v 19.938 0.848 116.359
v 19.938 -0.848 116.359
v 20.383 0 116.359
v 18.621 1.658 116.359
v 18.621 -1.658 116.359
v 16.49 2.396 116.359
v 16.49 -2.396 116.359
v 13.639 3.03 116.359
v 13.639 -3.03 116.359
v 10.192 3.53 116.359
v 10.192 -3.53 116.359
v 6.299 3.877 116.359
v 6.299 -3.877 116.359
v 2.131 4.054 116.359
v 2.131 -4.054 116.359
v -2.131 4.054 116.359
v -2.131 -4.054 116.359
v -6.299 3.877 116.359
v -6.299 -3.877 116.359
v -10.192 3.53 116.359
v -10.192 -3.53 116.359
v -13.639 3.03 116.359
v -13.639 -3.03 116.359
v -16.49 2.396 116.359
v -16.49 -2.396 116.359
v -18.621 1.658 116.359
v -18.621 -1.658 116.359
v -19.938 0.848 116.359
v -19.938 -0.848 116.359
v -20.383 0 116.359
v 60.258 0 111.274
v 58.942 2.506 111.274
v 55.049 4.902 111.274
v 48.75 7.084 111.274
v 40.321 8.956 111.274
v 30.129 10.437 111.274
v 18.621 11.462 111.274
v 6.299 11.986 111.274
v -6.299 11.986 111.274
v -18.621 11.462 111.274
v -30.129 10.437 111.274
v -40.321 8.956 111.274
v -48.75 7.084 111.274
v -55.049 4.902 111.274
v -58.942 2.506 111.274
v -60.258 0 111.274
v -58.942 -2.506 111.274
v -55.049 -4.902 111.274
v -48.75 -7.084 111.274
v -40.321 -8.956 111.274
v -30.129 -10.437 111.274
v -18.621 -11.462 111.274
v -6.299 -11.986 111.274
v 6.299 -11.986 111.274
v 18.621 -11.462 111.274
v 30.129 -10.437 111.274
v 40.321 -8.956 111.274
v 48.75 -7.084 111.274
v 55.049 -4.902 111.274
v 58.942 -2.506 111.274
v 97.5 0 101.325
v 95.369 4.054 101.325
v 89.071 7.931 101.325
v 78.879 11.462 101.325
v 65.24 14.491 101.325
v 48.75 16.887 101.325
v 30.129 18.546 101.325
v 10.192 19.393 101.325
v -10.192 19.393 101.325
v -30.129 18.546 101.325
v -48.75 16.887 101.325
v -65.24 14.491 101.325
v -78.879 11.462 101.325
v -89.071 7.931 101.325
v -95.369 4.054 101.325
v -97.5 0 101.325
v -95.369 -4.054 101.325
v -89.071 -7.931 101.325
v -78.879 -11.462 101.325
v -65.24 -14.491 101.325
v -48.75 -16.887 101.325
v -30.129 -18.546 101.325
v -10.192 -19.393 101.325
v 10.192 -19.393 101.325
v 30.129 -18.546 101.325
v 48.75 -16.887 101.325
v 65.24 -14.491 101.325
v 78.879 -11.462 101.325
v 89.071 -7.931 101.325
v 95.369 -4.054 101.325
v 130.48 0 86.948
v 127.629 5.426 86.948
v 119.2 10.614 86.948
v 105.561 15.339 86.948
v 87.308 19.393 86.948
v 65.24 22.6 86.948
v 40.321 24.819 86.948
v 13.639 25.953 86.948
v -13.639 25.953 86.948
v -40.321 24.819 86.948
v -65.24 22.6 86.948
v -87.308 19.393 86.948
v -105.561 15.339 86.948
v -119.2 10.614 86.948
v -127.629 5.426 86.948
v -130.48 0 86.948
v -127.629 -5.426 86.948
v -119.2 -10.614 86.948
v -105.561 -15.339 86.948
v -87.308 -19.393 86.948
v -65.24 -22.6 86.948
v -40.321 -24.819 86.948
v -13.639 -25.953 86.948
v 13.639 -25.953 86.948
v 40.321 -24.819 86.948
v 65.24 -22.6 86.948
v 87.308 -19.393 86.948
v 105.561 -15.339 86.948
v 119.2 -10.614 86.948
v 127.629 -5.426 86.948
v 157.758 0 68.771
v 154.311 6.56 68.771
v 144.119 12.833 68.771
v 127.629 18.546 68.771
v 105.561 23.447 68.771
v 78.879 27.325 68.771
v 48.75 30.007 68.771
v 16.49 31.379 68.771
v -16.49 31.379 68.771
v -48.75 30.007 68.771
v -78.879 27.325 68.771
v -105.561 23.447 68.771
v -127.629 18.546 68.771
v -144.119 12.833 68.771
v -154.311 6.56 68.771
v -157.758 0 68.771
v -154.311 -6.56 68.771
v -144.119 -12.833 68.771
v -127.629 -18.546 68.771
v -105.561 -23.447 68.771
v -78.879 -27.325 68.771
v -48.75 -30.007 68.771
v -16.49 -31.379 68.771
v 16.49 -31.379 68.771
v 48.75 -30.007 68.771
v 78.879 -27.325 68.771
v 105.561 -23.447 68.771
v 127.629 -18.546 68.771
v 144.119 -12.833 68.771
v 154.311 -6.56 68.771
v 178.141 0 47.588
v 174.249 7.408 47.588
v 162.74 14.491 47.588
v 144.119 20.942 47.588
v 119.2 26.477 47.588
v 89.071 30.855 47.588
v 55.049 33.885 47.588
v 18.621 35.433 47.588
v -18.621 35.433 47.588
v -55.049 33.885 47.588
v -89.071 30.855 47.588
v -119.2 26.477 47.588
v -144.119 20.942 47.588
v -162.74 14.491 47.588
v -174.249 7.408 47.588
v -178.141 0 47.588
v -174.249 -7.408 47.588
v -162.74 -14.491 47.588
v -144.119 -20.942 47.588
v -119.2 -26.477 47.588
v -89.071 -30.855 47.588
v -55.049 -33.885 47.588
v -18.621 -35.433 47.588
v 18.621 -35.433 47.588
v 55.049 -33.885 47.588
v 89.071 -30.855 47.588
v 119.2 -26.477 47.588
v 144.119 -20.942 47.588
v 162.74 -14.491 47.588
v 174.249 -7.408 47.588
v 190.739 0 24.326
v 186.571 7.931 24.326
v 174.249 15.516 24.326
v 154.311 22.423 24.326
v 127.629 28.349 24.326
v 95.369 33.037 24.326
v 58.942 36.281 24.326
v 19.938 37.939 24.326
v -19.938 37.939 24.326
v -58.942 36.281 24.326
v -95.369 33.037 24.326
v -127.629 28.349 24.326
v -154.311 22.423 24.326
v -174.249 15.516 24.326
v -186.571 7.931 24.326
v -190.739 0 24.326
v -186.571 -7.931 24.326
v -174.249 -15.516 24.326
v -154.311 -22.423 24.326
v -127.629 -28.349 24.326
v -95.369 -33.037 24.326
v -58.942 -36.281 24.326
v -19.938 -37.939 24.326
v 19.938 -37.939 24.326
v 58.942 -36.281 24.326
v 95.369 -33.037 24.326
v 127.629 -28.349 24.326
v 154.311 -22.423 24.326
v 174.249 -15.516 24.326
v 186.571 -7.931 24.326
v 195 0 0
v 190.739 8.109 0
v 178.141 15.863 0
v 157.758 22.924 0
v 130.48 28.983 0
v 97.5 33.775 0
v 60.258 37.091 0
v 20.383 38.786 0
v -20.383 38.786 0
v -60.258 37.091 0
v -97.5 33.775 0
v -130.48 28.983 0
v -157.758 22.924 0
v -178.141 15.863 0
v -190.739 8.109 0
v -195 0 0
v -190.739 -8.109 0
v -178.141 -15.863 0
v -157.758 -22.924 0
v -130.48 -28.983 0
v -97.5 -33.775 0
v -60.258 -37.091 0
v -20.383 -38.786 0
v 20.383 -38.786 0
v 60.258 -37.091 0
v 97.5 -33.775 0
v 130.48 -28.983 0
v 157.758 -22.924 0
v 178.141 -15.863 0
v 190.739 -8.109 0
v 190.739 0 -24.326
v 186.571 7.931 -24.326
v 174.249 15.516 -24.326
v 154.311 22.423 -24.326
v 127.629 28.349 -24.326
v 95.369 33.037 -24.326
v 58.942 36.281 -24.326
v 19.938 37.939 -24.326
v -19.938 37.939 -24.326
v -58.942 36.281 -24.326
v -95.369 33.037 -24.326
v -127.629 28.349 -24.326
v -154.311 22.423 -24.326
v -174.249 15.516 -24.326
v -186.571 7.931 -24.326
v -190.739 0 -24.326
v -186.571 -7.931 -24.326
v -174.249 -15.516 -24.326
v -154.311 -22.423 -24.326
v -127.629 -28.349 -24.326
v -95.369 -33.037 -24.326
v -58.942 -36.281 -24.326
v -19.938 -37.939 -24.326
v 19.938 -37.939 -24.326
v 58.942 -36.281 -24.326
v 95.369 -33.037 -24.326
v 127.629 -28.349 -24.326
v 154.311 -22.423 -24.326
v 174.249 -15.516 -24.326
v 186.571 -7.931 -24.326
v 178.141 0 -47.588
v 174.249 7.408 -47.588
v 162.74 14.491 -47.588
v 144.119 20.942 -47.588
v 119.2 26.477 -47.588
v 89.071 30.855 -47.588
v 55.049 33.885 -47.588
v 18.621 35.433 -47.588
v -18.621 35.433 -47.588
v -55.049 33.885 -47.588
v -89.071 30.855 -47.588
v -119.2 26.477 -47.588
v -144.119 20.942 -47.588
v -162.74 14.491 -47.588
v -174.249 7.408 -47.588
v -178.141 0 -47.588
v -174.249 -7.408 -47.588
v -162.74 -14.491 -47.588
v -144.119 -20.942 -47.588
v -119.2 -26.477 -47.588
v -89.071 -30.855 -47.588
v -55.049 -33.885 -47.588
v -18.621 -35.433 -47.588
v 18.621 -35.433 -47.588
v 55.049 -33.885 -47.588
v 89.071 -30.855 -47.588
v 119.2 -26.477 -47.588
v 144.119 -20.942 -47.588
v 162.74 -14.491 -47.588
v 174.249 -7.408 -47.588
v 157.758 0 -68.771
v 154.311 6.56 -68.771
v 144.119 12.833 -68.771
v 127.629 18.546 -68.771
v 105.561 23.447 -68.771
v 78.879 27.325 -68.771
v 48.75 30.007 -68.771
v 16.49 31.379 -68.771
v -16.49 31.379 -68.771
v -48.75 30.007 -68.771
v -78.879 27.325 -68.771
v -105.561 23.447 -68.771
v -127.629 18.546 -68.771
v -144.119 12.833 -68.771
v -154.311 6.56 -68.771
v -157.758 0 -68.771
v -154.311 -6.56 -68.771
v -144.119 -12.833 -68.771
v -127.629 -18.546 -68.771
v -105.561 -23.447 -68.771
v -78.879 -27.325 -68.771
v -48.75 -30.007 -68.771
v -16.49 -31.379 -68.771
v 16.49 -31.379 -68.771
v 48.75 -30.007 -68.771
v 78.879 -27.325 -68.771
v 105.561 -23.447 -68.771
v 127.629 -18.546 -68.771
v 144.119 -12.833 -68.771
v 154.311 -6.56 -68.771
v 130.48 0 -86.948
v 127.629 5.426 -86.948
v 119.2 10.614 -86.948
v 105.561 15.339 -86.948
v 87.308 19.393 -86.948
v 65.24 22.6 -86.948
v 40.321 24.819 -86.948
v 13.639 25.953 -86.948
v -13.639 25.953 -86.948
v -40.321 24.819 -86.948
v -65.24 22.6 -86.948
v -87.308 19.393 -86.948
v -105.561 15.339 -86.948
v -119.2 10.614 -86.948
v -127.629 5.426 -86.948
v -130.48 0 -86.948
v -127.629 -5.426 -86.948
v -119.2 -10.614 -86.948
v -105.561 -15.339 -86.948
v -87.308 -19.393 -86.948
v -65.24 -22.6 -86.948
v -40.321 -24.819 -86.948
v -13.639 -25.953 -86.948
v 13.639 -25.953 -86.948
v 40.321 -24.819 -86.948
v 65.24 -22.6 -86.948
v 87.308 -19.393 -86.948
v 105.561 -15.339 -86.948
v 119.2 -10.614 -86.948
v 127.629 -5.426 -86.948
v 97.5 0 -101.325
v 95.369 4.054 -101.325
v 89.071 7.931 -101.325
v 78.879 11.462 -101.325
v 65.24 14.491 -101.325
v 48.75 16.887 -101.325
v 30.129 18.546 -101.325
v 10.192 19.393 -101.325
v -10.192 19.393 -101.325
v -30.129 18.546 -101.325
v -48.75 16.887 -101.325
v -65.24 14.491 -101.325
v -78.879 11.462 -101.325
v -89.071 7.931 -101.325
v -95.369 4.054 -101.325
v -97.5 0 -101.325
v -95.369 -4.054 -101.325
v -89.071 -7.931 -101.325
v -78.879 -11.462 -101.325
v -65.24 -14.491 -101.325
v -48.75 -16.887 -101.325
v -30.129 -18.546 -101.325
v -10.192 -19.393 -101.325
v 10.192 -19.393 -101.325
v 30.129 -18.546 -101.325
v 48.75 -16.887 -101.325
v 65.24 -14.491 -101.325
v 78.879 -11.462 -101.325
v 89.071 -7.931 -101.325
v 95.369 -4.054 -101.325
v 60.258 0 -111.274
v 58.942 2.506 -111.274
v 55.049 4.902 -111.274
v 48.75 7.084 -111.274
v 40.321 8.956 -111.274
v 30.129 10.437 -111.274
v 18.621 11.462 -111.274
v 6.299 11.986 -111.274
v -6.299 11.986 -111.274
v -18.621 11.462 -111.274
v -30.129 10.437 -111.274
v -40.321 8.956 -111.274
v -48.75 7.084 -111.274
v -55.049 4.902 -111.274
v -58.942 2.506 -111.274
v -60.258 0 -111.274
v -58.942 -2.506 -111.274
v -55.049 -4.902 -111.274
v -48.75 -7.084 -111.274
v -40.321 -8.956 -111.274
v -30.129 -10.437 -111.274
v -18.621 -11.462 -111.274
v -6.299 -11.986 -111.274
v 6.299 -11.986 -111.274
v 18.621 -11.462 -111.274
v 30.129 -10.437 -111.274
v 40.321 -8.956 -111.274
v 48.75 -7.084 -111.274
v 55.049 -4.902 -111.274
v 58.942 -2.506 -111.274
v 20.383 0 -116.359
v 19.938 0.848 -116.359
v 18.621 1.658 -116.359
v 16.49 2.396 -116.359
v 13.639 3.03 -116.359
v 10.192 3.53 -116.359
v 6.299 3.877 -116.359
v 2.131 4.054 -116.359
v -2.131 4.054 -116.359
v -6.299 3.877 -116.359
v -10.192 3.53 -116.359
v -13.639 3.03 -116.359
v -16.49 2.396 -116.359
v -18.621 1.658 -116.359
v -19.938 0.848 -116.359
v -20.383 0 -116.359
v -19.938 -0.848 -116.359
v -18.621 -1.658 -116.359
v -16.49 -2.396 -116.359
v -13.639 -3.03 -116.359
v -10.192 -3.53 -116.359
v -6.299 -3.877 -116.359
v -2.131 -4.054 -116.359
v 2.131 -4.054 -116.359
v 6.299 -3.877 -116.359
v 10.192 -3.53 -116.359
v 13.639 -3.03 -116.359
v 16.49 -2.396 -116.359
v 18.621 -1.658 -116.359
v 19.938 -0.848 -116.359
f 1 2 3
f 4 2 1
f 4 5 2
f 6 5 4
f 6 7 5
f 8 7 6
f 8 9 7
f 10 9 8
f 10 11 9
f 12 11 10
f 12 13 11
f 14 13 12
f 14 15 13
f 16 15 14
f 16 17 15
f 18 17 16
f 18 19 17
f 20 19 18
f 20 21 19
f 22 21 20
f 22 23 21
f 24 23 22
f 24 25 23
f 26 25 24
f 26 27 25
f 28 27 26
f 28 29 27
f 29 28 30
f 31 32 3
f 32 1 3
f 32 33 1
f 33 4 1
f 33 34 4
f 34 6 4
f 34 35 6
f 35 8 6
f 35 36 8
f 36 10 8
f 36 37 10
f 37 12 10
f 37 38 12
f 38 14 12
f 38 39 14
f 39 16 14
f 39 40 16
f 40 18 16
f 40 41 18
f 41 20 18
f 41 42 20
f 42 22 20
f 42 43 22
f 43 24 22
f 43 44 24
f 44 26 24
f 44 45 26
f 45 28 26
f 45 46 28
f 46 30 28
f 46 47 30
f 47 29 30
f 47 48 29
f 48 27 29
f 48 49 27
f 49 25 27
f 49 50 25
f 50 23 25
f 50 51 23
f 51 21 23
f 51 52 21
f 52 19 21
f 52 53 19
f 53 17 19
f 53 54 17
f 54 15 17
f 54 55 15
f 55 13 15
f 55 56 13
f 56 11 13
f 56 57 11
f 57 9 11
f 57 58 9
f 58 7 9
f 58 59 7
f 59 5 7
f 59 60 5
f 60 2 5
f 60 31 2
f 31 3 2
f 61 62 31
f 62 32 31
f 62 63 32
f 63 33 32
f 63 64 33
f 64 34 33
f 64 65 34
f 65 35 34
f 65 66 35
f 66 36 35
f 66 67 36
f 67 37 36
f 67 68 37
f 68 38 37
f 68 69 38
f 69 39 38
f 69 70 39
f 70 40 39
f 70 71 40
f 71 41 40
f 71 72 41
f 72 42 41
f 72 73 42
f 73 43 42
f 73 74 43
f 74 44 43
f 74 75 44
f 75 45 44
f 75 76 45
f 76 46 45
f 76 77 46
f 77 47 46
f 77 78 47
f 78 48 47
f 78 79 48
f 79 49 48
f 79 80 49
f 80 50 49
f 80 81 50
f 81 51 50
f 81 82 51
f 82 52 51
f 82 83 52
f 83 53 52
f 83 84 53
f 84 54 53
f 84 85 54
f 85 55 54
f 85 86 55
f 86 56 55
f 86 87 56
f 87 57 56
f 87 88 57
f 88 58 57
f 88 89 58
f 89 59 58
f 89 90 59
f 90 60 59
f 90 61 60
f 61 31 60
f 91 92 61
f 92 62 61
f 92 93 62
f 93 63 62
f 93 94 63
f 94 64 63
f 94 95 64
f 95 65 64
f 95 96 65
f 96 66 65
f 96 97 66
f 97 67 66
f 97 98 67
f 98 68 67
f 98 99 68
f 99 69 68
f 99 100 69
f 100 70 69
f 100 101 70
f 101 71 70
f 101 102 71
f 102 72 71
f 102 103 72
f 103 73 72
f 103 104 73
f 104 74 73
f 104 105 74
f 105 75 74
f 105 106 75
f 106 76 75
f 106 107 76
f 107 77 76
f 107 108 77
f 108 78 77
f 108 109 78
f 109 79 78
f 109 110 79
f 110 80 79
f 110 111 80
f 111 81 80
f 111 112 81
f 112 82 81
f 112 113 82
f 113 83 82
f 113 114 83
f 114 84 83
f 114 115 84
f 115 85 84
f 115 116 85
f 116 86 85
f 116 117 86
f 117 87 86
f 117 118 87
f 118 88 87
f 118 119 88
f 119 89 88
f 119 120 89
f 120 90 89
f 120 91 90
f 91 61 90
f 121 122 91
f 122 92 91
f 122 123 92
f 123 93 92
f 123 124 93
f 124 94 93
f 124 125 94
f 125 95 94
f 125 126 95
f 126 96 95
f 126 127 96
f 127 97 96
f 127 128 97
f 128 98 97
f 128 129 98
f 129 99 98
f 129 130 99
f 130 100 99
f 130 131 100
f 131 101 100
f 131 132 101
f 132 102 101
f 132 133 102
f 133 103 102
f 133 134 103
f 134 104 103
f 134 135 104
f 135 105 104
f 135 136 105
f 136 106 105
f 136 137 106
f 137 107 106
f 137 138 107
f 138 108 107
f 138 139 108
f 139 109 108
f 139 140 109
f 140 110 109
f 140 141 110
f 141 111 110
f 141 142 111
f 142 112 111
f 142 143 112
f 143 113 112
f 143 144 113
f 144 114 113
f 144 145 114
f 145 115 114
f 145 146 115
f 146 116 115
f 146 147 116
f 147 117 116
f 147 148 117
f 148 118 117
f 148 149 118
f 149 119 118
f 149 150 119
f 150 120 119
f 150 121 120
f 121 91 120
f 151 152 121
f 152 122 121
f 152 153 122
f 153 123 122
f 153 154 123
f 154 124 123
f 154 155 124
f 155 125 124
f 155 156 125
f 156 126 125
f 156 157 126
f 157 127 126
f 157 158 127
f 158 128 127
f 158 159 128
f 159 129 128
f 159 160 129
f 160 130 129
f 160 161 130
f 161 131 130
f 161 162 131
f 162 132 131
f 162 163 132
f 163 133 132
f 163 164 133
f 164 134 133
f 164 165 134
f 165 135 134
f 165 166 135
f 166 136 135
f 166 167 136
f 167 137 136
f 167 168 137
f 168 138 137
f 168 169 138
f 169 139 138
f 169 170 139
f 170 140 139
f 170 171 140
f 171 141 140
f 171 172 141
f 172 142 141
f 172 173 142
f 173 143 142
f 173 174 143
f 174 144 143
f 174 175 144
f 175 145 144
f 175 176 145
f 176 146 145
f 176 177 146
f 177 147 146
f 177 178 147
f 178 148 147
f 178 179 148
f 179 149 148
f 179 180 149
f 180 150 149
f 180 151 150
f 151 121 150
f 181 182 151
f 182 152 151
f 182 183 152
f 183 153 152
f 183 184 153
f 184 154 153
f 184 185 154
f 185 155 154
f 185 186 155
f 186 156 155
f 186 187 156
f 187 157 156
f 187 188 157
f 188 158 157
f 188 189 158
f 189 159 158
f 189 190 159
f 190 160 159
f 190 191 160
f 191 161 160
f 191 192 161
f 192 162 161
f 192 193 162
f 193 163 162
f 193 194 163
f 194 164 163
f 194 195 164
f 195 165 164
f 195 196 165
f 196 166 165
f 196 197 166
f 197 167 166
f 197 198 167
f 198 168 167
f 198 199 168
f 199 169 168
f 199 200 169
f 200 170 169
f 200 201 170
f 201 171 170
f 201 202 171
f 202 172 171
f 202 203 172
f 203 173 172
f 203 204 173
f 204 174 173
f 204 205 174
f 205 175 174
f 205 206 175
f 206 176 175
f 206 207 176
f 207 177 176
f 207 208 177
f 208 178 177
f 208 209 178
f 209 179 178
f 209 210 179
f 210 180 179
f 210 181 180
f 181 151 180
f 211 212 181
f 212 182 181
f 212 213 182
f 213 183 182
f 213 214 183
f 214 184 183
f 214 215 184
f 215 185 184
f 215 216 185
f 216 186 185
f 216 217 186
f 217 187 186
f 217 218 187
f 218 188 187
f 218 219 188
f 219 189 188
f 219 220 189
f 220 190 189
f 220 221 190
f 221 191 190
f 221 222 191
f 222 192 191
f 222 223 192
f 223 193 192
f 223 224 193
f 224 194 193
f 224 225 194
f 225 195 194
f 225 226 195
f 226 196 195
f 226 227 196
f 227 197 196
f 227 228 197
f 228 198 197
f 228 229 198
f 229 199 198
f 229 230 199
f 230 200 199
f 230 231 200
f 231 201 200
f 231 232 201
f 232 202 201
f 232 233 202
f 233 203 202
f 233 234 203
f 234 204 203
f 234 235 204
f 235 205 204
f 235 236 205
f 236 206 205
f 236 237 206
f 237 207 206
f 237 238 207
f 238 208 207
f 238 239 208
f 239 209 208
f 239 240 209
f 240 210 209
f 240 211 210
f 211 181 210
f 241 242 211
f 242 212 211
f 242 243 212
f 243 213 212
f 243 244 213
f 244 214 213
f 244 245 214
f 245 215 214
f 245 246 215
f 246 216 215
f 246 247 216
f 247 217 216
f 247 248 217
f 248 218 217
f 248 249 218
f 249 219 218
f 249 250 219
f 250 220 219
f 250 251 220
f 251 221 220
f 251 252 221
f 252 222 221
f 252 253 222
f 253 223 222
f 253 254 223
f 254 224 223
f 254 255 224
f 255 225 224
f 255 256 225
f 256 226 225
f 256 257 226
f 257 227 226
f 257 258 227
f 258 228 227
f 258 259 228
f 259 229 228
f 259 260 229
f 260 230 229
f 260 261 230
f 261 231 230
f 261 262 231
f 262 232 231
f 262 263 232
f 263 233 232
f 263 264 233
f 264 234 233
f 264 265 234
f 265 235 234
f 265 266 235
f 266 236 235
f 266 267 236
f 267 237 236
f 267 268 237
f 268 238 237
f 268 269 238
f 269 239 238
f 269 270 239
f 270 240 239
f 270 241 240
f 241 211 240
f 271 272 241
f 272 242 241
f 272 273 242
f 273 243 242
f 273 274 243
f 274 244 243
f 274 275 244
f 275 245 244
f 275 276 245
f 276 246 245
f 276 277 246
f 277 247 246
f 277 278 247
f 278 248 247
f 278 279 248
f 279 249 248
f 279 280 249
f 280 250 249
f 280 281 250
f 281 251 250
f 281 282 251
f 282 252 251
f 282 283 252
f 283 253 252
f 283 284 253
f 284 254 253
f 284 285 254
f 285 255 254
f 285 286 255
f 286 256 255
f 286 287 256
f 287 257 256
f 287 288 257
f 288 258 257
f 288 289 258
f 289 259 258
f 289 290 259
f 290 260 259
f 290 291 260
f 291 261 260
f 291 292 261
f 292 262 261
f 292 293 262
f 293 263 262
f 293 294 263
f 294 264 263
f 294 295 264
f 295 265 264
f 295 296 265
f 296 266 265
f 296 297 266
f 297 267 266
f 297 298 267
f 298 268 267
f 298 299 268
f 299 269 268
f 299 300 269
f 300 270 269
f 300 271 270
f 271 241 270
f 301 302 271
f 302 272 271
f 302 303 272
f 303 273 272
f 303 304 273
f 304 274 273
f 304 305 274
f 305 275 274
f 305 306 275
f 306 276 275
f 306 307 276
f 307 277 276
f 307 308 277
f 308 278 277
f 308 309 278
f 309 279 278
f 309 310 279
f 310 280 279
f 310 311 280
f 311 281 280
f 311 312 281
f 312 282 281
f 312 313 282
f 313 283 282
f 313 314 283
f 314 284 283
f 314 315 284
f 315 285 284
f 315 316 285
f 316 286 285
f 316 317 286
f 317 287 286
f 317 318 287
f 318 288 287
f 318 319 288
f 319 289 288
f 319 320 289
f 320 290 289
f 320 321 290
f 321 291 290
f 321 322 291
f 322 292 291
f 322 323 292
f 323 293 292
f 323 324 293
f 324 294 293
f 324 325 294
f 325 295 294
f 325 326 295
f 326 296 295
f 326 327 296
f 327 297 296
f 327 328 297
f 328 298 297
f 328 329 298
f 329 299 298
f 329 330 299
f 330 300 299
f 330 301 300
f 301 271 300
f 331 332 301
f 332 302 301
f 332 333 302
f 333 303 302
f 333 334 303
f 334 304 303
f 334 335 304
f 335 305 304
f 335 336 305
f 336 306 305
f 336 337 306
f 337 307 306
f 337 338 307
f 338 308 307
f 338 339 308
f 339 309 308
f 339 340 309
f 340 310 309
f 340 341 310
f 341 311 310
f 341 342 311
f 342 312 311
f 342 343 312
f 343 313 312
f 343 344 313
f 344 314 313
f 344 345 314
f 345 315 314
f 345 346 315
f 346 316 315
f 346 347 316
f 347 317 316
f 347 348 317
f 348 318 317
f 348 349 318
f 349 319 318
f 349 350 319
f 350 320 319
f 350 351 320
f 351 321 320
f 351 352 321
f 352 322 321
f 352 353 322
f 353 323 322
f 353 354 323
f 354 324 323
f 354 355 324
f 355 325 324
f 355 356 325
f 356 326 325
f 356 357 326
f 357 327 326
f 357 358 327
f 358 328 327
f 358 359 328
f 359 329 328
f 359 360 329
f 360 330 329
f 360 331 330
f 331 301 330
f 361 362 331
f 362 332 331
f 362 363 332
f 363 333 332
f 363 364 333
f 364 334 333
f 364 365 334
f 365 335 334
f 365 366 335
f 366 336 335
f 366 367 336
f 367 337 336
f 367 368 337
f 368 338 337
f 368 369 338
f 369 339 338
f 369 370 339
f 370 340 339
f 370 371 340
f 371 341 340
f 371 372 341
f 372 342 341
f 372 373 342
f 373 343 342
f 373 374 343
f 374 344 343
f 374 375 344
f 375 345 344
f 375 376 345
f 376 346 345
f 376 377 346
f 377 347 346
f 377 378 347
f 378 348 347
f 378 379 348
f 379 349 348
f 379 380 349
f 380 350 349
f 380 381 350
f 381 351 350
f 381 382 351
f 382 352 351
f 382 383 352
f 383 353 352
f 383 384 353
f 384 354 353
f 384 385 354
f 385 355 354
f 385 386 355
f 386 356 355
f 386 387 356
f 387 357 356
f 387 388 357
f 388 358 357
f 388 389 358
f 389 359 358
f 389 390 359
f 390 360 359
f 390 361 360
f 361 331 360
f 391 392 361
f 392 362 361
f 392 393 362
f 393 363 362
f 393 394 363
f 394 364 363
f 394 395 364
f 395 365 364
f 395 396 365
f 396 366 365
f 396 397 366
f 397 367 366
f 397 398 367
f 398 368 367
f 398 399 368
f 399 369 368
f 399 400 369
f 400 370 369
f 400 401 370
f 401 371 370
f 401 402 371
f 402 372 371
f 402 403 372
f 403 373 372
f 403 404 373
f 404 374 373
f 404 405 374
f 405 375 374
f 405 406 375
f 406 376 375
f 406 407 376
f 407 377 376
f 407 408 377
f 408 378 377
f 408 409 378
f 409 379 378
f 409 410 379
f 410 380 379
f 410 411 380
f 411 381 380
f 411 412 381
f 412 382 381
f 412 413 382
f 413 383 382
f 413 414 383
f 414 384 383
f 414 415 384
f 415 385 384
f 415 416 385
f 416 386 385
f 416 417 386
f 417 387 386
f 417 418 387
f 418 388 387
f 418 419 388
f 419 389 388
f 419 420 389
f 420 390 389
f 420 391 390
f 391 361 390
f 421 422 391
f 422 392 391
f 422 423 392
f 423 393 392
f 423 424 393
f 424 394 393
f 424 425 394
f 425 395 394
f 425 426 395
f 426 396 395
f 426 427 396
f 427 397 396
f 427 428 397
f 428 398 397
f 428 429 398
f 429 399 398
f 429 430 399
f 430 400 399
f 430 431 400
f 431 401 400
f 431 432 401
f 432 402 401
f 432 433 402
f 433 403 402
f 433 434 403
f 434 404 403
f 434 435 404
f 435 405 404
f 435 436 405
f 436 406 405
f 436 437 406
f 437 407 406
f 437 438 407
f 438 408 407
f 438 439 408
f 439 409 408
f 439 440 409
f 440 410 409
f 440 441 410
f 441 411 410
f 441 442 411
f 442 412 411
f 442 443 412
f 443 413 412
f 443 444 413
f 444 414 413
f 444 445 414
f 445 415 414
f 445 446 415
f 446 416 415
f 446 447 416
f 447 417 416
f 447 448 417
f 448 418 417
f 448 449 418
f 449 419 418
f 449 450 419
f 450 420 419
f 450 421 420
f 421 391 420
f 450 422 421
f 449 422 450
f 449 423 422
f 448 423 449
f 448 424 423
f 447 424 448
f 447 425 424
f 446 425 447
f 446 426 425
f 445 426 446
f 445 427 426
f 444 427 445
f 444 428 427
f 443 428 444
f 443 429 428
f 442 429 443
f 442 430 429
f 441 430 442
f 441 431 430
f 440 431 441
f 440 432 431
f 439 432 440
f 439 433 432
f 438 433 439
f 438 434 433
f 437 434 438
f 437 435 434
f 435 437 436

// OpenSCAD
// Generated by SolidPython 1.0.1 on 2020-07-29 00:46:51


scale(v = [15, 3, 9]) {
	sphere(r = 13);
}
/***********************************************
*********      SolidPython code:      **********
************************************************
 
# import packages: SolidPython
from solid import *
from solid.utils import *
from itertools import chain, combinations, permutations


class Resize:

    def __init__(self, scad_file):
        self.scad_file = scad_file
        #self.scad_file = import_scad(scad_file)
        # cone/cylinder param:
        self.r1 = 0
        self.r2 = 0
        self.h = 0
        # rectangular prism param:
        self.w = 0
        self.l = 0
        # ellipse param:
        self.r = 0

    # import OpenScad code (file name corresponds to shape)


    # classify shape + parameters
    def assign(self, param1, param2, param3):
        if self.scad_file == 'cone.scad':
            self.r1 = param1
            self.r2 = param2
            self.h = param3
        elif self.scad_file == 'cylinder.scad':
            self.r1 = param1
            self.r2 = param2
            self.h = param3
        elif self.scad_file == 'rectangularPrism.scad':
            self.h = param1
            self.l = param2
            self.w = param3
        else:
            self.r = param1
            self.h = param2

    # resize parameters
    def iterate(self):
        x = range(3, 20, 2)
        i = 1
        if self.scad_file == 'cone.scad':
            tempList = list(permutations(x, 2))
            for temp in tempList:
                param1 = temp[0]
                param2 = temp[1]
                filepath = 'produced_scad_files/' + 'cone' + str(param1) + '_' + str(param2) + '_' + '.scad'
                scad_render_to_file(cylinder(h=param1, r1=param2, r2=0), filepath)

        elif self.scad_file == 'cylinder.scad':
            tempList = list(permutations(x, 3))
            for temp in tempList:
                param1 = temp[0]
                param2 = temp[1]
                filepath = 'produced_scad_files/' + 'cylinder' + str(param1) + '_' + str(param2) + '_' + '.scad'
                scad_render_to_file(cylinder(h=param1, r1=param2, r2=param2), filepath)

        elif self.scad_file == 'rectangularPrism.scad':
            tempList = list(permutations(x, 3))
            for temp in tempList:
                param1 = temp[0]
                param2 = temp[1]
                param3 = temp[2]
                filepath = 'produced_scad_files/' + 'rectangularPrism' + str(param1) + '_' + str(param2) + '_' + str(
                    param3) + '.scad'
                scad_render_to_file(cube(size=(param1, param2, param3)), filepath)

        elif self.scad_file == 'ellipse.scad':
            tempList = list(permutations(x, 4))
            for temp in tempList:
                param1 = temp[0]
                param2 = temp[1]
                param3 = temp[2]
                param4 = temp[3]
                filepath = 'produced_scad_files/' + 'ellipse' + str(param1) + '_' + str(param2) + '_' + str(param3) + '_' + str(param4) + '.scad'
                scad_render_to_file(scale([param1, param2, param3])(sphere(r=param4)), filepath)

    def render_to_scadfile(self):
        scad_render_to_file(scad, 'example.scad') 
 
************************************************/
